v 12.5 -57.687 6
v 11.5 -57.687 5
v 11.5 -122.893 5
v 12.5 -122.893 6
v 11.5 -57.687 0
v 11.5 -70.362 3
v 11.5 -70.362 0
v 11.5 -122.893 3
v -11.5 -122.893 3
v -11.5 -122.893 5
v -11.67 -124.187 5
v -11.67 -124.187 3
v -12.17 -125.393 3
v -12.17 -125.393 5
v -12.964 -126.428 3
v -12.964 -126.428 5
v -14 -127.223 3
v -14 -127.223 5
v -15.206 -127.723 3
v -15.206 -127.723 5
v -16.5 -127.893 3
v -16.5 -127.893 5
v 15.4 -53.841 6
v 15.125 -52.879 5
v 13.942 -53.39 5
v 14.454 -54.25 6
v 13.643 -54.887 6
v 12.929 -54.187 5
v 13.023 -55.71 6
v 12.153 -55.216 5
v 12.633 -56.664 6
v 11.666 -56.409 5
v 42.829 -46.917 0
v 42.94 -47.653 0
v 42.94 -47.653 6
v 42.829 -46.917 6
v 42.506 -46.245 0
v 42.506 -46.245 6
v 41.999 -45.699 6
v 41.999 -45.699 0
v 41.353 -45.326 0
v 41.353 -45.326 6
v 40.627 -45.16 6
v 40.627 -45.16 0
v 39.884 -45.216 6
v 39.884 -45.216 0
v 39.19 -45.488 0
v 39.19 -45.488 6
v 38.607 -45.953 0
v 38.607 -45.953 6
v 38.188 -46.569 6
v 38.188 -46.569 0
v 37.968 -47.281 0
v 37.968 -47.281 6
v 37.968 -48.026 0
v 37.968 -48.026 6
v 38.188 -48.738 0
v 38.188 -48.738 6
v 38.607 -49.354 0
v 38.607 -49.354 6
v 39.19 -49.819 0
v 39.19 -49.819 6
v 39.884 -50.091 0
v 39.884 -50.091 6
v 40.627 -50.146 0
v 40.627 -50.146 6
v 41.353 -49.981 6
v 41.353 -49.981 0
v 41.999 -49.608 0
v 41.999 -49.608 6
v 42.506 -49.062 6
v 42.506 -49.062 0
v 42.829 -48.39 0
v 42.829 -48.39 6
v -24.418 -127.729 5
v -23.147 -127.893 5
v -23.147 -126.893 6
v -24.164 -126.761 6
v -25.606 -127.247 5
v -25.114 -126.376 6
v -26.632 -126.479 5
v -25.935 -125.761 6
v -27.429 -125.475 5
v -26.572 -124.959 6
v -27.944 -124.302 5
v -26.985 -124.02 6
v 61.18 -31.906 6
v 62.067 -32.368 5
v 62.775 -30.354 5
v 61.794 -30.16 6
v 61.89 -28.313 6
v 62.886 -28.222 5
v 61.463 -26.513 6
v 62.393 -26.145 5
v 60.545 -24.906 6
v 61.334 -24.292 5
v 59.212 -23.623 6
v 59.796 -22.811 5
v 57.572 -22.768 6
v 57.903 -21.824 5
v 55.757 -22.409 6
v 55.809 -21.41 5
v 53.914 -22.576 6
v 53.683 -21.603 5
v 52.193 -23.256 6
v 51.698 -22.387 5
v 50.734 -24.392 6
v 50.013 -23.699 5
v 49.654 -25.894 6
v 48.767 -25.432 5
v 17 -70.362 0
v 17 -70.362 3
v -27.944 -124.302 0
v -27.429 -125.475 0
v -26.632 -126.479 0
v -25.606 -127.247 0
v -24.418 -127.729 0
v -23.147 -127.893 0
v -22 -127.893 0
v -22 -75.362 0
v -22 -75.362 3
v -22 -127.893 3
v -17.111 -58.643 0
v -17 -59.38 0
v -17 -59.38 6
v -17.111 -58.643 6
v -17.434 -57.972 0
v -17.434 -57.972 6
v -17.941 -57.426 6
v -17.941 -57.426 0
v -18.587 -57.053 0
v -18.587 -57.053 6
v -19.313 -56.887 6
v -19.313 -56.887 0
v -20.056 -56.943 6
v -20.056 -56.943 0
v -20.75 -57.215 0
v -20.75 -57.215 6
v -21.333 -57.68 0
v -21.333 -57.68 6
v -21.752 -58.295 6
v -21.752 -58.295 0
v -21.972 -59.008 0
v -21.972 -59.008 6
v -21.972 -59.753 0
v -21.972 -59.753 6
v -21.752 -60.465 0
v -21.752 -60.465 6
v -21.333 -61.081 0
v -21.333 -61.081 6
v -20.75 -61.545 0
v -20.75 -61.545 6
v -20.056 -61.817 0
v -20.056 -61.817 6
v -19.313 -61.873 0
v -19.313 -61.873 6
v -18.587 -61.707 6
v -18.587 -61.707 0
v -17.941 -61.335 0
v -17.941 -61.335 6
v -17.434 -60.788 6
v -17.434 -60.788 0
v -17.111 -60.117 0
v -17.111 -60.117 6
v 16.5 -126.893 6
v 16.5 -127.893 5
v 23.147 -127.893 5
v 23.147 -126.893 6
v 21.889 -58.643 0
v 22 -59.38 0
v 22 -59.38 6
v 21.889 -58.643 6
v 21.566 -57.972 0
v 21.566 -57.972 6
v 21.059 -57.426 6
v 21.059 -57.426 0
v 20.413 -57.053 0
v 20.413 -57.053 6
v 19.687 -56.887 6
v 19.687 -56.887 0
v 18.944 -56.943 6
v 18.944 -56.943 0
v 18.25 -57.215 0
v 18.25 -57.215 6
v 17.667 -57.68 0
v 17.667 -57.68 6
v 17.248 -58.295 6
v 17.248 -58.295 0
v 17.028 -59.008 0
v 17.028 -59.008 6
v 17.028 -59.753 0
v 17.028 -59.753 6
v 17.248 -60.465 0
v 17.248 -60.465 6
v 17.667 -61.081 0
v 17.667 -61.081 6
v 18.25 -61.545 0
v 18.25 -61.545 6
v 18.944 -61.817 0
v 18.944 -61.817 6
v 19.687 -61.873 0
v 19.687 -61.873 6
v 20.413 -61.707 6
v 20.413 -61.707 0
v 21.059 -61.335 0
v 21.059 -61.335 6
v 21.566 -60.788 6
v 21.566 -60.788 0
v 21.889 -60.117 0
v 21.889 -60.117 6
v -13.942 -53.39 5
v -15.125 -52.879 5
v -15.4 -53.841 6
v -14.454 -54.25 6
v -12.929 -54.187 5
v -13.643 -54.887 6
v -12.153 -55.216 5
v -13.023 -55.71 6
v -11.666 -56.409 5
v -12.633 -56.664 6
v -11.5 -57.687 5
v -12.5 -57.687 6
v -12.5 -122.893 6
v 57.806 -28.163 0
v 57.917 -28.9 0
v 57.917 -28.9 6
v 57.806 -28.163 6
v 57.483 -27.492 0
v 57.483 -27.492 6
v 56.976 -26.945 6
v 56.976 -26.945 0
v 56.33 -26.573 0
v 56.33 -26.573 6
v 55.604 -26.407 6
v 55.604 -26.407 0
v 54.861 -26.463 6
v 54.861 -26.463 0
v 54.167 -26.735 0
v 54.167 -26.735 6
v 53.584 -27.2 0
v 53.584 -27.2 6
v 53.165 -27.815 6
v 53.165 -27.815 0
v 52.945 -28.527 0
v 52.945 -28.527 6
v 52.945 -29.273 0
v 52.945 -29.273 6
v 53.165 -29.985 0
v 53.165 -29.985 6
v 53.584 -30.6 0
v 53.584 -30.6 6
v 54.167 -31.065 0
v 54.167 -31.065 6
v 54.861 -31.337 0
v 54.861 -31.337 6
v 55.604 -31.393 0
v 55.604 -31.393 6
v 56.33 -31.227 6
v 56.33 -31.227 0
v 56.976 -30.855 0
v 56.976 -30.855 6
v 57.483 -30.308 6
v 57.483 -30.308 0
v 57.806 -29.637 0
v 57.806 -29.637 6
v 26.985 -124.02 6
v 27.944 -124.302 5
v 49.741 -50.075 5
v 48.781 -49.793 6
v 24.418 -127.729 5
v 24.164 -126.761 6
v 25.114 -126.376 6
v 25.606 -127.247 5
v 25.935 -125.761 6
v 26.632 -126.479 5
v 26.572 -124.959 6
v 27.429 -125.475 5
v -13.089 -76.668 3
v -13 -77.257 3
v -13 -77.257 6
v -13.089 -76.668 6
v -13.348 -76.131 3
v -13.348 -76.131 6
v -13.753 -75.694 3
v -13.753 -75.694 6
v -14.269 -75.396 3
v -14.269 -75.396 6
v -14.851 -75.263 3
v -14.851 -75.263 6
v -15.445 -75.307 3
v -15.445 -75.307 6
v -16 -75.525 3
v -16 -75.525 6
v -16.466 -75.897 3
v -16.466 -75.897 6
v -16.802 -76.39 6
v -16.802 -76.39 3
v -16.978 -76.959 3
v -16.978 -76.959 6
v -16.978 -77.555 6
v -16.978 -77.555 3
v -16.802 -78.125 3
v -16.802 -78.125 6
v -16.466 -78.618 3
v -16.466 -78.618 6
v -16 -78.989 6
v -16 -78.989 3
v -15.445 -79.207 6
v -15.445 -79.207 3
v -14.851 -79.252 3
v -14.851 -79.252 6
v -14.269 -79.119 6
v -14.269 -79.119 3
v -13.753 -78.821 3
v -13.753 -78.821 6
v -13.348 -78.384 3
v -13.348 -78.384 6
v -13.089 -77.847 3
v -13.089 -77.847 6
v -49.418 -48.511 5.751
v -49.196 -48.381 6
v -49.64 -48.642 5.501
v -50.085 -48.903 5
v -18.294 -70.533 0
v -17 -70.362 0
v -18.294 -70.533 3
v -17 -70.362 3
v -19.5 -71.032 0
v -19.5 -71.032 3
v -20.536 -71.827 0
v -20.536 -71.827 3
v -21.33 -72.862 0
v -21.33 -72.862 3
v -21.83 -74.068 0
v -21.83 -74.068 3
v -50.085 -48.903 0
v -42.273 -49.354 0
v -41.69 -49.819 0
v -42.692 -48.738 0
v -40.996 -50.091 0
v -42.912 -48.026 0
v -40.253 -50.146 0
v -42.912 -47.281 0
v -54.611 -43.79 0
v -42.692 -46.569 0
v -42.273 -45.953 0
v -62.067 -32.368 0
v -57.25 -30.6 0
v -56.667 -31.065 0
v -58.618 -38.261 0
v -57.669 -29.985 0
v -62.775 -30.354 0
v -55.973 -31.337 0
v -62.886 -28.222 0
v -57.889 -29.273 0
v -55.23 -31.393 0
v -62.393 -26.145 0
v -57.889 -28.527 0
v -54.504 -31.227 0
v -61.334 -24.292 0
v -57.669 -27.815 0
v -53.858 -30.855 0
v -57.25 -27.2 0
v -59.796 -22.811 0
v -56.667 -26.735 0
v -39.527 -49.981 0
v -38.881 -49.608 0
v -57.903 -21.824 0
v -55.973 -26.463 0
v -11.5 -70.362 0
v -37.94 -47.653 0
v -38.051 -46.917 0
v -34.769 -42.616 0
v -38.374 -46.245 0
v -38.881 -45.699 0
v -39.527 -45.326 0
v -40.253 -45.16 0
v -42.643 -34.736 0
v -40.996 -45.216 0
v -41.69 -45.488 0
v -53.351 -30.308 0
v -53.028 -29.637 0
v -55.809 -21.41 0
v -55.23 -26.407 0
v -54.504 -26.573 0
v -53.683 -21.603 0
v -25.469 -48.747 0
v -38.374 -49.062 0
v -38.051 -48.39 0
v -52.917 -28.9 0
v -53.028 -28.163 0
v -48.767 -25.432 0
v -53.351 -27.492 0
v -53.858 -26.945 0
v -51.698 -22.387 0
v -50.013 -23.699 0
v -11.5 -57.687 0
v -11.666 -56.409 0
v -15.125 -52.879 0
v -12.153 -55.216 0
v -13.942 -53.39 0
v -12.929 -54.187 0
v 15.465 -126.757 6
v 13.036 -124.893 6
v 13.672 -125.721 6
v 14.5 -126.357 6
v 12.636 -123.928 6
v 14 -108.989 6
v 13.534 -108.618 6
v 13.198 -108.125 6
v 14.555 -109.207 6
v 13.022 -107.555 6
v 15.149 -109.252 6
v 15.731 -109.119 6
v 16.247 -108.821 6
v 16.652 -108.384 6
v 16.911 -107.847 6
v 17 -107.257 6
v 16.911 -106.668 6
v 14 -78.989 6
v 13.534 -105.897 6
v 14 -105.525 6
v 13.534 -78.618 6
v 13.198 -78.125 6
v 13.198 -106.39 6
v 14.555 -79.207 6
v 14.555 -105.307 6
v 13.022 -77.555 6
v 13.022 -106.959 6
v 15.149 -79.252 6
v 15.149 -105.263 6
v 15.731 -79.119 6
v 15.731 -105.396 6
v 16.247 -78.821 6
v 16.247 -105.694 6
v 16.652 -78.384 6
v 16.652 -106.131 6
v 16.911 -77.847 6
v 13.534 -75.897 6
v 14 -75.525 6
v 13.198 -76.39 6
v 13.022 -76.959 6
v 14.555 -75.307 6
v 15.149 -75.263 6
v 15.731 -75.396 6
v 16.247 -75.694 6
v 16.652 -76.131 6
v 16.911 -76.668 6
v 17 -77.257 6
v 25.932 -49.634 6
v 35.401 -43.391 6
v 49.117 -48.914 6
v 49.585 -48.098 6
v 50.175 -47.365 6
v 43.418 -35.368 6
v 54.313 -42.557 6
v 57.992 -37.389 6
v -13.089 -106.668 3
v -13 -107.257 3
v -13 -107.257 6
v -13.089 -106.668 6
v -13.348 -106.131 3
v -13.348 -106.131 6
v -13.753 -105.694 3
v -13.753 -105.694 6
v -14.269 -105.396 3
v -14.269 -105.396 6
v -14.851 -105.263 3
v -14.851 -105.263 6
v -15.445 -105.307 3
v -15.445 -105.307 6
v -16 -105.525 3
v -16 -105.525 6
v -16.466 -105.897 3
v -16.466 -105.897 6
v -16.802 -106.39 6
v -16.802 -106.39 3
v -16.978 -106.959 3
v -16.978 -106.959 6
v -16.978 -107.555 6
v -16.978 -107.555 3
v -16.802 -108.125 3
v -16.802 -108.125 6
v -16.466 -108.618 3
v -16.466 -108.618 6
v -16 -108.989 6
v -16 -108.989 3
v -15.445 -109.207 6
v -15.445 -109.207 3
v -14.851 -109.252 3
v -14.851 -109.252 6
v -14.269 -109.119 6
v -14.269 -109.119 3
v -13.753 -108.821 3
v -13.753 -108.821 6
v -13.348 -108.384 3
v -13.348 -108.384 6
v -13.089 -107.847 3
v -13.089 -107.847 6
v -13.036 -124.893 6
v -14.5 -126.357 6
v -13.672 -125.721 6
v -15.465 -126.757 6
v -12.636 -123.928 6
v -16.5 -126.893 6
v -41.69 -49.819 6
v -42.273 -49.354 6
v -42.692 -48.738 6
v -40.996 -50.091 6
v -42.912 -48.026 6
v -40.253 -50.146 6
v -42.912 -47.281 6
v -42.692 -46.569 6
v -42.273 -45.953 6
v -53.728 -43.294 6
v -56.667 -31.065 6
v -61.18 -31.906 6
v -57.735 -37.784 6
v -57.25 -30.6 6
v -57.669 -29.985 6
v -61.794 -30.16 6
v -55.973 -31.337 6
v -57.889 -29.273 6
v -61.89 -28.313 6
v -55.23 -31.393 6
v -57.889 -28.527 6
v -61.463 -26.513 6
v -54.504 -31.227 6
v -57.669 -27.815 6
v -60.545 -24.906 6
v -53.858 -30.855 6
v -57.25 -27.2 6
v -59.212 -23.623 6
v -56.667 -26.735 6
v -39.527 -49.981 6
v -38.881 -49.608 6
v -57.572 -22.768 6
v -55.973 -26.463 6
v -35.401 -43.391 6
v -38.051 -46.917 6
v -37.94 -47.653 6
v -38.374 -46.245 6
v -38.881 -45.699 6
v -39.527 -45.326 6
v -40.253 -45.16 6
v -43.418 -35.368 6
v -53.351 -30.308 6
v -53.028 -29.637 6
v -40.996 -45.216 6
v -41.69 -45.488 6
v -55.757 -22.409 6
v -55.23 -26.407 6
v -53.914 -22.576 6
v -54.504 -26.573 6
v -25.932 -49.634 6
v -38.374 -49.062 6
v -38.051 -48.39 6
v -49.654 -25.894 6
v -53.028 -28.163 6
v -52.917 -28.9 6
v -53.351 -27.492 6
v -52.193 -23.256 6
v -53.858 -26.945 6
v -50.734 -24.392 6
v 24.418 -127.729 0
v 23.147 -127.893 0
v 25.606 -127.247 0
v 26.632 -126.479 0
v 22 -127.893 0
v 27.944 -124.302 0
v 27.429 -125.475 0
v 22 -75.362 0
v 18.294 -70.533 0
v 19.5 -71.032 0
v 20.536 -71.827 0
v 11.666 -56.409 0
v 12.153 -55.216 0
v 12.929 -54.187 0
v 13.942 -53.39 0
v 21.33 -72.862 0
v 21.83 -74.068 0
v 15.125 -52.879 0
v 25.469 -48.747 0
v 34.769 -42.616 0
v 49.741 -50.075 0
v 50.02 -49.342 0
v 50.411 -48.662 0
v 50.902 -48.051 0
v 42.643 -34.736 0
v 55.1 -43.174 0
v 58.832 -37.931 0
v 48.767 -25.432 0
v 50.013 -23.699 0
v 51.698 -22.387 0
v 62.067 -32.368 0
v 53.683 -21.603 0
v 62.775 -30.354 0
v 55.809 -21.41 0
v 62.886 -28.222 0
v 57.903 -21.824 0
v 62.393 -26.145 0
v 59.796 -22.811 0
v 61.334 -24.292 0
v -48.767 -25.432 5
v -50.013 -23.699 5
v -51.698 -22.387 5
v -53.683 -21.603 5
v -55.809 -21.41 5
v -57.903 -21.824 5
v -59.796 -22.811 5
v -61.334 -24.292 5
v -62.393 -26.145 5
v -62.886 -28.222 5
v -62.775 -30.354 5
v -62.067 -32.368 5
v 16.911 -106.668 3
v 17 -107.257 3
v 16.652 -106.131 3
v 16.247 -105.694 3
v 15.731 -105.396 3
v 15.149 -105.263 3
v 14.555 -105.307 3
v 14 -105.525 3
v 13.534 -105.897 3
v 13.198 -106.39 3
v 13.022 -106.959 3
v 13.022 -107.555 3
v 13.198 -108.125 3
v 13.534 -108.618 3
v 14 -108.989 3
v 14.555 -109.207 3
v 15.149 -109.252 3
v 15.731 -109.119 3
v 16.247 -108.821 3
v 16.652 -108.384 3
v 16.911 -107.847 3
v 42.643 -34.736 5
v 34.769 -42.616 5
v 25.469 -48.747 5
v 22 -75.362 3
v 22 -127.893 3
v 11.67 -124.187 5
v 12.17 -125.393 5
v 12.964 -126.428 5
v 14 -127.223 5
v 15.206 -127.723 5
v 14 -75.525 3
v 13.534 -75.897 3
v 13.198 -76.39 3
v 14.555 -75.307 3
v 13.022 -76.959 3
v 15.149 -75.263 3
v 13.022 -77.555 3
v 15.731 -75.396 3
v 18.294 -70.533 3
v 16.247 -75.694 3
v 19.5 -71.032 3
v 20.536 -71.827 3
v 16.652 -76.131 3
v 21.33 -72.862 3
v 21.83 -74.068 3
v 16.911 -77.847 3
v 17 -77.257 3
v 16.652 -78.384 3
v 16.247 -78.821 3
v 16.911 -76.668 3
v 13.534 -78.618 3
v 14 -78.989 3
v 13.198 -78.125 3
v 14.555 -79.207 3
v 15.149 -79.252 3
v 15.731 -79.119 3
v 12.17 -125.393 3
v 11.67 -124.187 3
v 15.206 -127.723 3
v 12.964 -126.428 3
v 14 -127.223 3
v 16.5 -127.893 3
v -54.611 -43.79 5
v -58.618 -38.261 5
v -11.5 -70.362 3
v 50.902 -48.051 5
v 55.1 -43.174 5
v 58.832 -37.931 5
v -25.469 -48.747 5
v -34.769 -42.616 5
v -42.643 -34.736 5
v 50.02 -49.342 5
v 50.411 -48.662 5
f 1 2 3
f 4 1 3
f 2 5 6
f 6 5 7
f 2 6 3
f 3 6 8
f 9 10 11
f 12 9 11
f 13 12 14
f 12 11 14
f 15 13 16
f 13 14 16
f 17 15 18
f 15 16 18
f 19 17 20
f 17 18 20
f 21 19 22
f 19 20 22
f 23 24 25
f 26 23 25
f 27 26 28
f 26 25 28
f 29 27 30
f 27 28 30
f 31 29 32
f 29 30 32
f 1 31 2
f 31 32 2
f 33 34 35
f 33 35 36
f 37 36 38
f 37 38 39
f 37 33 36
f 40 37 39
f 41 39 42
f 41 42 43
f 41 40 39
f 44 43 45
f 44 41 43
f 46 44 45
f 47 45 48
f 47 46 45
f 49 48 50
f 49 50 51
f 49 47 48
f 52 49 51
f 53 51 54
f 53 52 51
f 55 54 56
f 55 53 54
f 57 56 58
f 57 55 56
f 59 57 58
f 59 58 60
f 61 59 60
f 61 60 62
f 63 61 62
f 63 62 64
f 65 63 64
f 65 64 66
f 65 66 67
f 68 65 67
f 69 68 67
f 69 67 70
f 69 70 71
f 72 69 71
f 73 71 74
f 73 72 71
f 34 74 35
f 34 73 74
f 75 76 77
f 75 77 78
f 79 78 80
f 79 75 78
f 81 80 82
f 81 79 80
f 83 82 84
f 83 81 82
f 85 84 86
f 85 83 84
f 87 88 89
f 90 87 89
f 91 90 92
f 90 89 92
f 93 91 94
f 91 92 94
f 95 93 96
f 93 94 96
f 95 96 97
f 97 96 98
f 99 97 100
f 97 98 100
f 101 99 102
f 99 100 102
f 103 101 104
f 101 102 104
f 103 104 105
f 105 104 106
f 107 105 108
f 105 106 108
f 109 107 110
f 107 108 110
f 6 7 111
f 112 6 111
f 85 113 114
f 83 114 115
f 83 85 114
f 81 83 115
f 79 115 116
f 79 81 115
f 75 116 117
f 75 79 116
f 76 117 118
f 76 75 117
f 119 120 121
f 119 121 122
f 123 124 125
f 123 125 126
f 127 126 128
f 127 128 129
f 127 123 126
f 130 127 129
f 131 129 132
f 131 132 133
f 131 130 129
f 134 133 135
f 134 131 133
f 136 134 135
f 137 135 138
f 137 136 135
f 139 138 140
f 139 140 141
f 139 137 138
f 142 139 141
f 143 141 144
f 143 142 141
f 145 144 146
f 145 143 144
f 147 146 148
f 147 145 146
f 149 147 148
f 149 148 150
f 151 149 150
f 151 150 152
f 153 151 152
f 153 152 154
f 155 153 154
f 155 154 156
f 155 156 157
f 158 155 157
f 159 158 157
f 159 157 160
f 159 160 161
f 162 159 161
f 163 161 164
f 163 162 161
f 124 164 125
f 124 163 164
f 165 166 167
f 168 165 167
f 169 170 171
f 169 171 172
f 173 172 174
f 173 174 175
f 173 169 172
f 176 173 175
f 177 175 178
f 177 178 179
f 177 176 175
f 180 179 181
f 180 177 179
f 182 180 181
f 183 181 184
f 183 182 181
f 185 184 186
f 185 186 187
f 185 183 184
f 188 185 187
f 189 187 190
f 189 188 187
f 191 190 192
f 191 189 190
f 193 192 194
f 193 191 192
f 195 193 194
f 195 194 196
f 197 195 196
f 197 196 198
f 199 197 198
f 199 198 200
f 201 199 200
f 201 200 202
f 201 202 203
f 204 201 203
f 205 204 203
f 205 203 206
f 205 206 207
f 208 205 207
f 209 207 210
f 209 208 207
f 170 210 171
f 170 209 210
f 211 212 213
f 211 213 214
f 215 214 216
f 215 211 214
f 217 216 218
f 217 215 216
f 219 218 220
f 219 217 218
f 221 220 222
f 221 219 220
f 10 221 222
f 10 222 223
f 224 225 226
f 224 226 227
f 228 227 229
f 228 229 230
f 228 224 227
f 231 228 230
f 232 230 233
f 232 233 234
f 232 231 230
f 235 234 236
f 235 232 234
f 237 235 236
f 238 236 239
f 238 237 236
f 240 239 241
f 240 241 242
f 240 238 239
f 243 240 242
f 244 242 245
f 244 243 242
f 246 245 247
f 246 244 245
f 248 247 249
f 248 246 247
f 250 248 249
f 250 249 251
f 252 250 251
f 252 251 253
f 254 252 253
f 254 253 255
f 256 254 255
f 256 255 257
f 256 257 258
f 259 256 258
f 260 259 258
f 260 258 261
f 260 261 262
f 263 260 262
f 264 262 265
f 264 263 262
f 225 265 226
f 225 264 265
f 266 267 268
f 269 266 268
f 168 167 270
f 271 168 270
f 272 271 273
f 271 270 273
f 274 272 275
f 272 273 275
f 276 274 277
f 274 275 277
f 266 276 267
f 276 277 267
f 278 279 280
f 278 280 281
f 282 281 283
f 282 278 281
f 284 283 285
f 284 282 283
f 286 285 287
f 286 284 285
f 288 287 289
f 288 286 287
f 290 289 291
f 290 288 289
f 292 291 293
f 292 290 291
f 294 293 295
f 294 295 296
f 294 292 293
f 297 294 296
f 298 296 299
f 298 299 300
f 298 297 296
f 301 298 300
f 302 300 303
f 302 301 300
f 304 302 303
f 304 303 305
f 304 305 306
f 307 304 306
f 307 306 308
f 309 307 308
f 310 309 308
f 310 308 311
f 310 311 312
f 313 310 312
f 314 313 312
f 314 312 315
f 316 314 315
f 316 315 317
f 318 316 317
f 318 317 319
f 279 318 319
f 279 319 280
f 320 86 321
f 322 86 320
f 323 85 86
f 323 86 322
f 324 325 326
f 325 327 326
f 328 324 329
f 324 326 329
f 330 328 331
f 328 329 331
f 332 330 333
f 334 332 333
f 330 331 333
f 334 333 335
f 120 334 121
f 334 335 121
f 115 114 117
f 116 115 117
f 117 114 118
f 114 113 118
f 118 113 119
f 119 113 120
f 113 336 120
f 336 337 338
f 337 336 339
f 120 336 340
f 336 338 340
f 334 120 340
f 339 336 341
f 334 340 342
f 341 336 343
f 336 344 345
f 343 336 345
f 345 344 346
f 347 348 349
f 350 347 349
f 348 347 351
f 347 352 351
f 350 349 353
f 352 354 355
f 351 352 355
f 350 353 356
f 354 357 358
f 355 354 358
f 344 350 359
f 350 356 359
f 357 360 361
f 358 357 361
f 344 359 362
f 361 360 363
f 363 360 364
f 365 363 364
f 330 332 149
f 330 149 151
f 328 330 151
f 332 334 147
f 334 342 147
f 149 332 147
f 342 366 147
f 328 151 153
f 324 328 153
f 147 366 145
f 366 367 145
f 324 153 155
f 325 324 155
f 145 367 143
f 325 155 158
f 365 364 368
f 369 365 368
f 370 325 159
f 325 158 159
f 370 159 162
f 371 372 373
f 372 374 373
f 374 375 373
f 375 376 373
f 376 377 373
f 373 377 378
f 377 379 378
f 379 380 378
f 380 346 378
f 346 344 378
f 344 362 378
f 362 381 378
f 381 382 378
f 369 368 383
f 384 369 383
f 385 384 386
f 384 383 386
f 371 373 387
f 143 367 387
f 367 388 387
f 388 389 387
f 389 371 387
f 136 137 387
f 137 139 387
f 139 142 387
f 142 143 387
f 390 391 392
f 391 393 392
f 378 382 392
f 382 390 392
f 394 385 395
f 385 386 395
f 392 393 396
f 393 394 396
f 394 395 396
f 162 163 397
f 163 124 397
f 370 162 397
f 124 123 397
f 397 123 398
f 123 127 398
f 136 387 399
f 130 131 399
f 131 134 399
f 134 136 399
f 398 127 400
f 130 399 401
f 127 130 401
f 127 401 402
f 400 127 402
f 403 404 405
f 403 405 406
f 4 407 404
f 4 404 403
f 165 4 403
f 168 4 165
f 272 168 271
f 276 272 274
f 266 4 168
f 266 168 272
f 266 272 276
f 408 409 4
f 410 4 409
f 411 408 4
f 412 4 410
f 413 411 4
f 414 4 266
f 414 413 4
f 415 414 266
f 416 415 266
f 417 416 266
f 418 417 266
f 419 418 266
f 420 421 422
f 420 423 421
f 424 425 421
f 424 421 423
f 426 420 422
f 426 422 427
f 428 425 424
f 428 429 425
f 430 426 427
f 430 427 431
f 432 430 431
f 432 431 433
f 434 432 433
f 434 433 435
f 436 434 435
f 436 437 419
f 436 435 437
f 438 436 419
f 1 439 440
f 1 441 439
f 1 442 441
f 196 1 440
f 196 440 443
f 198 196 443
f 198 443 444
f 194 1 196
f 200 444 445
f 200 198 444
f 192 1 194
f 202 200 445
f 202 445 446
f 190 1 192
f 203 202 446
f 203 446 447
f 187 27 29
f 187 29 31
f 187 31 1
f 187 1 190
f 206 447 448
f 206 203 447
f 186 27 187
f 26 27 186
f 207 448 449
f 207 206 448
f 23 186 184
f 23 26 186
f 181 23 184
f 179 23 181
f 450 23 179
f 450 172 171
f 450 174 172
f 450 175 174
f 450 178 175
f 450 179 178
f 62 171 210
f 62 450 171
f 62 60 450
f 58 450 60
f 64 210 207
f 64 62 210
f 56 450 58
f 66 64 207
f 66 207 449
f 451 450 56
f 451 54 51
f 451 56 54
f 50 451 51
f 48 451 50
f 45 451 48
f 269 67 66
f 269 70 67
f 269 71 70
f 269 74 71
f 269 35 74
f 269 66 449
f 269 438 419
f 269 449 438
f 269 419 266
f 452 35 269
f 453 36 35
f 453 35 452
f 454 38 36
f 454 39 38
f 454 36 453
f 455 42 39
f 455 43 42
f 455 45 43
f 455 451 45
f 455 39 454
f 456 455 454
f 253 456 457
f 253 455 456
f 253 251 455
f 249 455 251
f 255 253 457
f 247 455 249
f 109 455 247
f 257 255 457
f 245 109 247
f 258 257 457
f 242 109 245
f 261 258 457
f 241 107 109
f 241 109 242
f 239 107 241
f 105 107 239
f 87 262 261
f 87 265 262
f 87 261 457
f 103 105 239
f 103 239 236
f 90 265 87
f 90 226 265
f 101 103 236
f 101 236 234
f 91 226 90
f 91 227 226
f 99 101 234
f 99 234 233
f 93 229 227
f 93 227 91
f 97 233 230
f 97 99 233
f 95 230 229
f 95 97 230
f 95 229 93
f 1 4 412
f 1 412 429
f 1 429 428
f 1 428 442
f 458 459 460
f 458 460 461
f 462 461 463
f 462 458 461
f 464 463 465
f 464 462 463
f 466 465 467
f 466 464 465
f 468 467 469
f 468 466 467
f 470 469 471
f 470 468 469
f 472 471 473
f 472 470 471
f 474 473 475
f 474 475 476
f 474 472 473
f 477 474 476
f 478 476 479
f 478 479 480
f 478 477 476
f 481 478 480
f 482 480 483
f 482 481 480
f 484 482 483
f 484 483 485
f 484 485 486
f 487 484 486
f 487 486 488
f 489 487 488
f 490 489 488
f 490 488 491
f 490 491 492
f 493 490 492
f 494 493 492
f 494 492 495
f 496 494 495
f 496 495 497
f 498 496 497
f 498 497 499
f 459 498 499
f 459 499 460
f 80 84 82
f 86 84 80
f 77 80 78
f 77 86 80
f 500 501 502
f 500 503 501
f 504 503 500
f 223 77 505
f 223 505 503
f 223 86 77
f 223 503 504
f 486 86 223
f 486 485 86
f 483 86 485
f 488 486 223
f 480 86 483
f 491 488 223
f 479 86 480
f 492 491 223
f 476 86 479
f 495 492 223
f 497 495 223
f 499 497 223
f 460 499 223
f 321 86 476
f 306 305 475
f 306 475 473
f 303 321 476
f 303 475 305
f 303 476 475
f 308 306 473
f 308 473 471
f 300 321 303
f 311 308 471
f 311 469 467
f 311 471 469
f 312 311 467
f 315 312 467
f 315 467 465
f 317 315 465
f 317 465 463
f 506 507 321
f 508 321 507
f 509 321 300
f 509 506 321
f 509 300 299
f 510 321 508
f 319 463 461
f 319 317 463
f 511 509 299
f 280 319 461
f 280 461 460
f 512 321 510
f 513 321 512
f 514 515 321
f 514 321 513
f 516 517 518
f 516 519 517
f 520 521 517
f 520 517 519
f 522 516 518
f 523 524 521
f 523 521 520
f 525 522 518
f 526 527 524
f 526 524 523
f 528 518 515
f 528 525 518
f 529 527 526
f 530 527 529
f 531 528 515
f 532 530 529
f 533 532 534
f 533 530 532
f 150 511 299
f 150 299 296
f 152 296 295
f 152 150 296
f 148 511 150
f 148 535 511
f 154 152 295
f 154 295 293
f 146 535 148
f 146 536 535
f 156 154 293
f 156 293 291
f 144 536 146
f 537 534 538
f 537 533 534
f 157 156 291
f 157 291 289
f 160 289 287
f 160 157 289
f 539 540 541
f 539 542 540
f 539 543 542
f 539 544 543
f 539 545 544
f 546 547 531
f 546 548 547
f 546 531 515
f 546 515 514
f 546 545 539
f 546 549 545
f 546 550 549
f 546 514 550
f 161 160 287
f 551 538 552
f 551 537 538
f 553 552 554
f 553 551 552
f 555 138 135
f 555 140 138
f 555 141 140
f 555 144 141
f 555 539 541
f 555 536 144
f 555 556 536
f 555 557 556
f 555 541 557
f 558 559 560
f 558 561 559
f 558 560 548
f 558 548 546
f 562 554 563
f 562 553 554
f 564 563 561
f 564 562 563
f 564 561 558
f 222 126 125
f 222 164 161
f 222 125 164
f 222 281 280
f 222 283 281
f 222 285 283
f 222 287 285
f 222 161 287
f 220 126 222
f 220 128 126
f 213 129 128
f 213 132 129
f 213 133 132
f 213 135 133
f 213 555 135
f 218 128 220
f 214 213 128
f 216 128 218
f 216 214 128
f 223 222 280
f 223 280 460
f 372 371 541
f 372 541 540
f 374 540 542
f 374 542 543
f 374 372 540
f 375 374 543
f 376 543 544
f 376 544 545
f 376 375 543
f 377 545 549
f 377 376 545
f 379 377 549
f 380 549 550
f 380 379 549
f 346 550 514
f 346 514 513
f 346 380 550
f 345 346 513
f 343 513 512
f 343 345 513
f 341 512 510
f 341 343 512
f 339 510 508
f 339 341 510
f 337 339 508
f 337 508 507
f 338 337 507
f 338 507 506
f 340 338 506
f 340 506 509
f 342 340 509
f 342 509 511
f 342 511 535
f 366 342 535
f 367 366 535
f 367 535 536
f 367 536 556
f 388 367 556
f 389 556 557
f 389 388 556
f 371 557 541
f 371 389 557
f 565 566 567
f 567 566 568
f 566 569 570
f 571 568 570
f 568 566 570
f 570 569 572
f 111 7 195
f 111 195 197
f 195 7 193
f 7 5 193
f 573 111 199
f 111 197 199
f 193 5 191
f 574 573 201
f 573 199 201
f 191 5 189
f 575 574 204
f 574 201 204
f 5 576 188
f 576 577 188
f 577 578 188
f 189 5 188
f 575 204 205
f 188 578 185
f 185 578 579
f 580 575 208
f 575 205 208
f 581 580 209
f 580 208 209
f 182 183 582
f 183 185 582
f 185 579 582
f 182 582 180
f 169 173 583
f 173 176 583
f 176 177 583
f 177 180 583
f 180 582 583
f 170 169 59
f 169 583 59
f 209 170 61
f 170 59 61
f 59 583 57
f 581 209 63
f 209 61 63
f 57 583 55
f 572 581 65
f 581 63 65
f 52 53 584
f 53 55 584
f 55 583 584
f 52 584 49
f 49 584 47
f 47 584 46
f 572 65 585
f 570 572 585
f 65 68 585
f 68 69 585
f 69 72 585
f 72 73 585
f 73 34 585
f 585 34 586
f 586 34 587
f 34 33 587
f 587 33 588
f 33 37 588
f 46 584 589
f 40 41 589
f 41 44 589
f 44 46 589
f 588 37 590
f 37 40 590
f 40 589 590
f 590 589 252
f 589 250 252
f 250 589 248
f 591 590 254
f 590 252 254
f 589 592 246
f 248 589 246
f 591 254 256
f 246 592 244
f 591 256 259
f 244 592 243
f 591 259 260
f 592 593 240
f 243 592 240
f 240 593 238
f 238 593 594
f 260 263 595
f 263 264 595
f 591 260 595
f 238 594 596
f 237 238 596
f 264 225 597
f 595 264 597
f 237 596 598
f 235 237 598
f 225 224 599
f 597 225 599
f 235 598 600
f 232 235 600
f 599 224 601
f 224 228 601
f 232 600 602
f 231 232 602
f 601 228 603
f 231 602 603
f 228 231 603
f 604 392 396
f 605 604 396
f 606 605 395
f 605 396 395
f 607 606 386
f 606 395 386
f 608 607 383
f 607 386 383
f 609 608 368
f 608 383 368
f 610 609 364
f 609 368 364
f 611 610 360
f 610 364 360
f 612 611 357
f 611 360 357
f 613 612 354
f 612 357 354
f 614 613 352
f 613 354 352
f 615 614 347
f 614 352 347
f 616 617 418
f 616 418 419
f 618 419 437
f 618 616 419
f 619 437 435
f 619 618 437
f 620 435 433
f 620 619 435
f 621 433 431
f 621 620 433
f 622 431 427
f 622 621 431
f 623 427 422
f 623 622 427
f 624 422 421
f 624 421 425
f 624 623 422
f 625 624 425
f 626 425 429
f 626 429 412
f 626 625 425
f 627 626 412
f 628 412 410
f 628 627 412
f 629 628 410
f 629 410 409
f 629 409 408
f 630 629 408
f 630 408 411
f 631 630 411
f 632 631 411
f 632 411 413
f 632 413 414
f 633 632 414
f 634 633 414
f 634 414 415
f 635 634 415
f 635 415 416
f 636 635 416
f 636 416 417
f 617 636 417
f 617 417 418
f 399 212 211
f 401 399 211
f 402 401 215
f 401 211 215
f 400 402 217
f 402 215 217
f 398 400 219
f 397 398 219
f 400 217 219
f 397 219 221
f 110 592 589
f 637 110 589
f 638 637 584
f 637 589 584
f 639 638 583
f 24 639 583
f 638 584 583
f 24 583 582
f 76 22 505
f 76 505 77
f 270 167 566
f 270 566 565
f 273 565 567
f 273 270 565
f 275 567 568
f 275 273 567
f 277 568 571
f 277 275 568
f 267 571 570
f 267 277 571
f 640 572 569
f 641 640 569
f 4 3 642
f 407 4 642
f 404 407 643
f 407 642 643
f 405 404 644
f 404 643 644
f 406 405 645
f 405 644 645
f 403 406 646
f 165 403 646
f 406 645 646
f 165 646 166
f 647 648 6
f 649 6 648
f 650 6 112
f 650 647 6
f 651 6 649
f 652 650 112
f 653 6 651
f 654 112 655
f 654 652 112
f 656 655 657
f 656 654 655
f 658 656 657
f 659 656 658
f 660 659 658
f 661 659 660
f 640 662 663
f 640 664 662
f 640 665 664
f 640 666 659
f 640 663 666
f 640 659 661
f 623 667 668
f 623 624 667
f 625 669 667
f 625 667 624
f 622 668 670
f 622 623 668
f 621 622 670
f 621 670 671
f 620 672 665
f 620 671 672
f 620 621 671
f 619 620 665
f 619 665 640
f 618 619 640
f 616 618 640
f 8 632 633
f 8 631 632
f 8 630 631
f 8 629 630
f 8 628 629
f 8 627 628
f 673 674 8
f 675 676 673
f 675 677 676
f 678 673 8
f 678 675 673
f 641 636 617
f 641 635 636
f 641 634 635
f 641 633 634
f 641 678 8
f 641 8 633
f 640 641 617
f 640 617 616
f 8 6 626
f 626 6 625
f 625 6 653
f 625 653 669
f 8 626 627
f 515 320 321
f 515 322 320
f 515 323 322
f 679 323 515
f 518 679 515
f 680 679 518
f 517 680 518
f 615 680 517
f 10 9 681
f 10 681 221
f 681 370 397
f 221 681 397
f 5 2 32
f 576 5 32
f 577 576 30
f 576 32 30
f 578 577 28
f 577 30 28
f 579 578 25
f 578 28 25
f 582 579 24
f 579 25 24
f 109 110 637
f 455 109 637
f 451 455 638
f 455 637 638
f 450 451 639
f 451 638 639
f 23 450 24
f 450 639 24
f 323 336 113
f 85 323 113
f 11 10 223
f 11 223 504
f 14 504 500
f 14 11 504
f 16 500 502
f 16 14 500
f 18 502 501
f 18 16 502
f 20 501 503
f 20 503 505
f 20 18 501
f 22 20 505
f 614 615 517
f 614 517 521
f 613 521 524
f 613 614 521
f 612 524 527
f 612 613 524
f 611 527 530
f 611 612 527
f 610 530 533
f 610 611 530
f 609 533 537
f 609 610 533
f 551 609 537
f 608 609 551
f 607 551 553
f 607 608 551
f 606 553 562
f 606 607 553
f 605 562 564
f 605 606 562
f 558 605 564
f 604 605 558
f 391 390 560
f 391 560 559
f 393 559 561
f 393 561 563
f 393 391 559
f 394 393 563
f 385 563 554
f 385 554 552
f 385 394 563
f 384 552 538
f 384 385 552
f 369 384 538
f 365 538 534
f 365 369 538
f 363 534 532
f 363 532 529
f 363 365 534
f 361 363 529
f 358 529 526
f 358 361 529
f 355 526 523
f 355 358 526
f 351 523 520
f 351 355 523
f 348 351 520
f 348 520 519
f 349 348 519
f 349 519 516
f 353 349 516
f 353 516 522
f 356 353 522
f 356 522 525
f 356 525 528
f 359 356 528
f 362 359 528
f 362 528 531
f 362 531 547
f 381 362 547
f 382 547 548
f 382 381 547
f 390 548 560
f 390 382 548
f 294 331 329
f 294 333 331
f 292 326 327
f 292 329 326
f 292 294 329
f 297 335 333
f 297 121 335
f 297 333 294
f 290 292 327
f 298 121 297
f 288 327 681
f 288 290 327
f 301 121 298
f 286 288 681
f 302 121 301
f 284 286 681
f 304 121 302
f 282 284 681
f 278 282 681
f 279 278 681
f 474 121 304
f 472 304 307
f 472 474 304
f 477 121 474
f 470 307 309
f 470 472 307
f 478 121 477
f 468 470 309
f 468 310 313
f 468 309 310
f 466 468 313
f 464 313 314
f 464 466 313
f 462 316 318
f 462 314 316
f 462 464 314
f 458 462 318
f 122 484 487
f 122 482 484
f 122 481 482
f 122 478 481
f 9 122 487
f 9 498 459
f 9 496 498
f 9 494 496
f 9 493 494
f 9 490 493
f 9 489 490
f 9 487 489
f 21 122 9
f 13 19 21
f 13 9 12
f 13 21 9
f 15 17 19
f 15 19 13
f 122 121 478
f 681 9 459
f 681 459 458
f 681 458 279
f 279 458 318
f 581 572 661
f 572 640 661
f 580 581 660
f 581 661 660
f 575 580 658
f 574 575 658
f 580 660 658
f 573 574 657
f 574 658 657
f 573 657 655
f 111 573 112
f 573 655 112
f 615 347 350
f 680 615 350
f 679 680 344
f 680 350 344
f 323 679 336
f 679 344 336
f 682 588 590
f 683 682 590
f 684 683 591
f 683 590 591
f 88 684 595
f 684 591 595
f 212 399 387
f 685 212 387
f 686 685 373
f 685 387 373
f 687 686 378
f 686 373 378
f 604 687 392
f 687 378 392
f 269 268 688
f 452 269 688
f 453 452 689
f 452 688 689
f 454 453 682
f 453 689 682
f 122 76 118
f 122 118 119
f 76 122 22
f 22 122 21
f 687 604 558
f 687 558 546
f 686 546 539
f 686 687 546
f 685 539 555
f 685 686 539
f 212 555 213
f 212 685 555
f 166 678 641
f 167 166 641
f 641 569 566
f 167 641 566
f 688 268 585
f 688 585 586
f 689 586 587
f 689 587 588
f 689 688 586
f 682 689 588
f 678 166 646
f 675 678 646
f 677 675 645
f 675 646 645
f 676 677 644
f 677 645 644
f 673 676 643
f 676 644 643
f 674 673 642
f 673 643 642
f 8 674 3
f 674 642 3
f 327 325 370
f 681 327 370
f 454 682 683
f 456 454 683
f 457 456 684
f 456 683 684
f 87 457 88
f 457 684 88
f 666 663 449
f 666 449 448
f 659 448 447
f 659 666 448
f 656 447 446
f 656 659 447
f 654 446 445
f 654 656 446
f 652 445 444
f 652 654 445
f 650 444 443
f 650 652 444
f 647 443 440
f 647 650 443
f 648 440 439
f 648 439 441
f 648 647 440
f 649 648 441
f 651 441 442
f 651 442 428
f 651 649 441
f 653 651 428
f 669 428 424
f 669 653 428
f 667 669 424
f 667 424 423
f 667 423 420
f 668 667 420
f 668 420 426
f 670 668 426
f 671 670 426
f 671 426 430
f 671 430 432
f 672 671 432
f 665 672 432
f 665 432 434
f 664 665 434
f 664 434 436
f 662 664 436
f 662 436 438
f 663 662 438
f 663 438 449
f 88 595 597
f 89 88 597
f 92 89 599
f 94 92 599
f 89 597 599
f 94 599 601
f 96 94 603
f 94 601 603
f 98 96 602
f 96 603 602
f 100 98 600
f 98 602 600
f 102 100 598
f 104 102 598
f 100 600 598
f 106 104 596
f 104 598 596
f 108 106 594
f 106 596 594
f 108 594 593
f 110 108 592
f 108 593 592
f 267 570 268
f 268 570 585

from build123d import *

# Parameters (mm, degrees)
F0_R      = 2
F0_R_2    = 2.5
F1_DEPTH  = 6
F2_R      = 5
F2_2_R    = 5
F3_SIZE   = 1
F3_2_SIZE = 1
F4_W      = 44
F4_H      = 80
F5_DEPTH  = 3
F6_R      = 5
F6_2_R    = 5


with BuildPart() as f1:
    # F0 (on Top) → F1 (new body)
    with BuildSketch(Plane.XY):
        with BuildLine():
            ThreePointArc((-48.7669224449, -25.4320128037), (-58.8849590698, -22.2499796708), (-62.0669922027, -32.3680162957))
            ThreePointArc((-62.0669922027, -32.3680162957), (-56.6822265111, -41.0746296118), (-50.0851457895, -48.9027419604))
            Line((-50.0851457895, -48.9027419604), (-26.8898074388, -127.8929053375))
            Line((-26.8898074388, -127.8929053375), (-11.5, -127.8929053375))
            Line((-11.5, -127.8929053375), (-11.5, -69.0488957189))
            Line((-11.5, -69.0488957189), (-11.5, -53.784291387))
            ThreePointArc((-11.5, -53.784291387), (-33.3014776018, -43.7722696412), (-48.7669224449, -25.4320128037))
        make_face()
        with Locations((-15, -107.2572916746)):
            Circle(F0_R, mode=Mode.SUBTRACT)
        with Locations((-15, -77.2572916746)):
            Circle(F0_R, mode=Mode.SUBTRACT)
        with Locations((-19.5, -59.3801313572)):
            Circle(F0_R_2, mode=Mode.SUBTRACT)
        with Locations((-40.4400420847, -47.6534678296)):
            Circle(F0_R_2, mode=Mode.SUBTRACT)
        with Locations((-55.4169573238, -28.9000145497)):
            Circle(F0_R_2, mode=Mode.SUBTRACT)
    extrude(amount=F1_DEPTH)

    # F2
    f2_edges = [f1.edges().sort_by_distance(p)[0] for p in [
        (-26.889807, -127.892905, 3),
        (-11.5, -127.892905, 3),
        (-11.5, -53.784291, 3),
    ]]
    fillet(f2_edges, radius=F2_R)

    # F3
    f3_edges = [f1.edges().sort_by_distance(p)[0] for p in [
        (-12.964466, -126.428439, 6),
    ]]
    chamfer(f3_edges, length=F3_SIZE)


with BuildPart() as f1b:
    # F0 (on Top) → F1, piece 2 (new body)
    with BuildSketch(Plane.XY):
        with BuildLine():
            Line((11.5, -69.0488957189), (11.5, -127.8929053375))
            Line((11.5, -127.8929053375), (26.8898074388, -127.8929053375))
            Line((26.8898074388, -127.8929053375), (50.0851457895, -48.9027419604))
            ThreePointArc((50.0851457895, -48.9027419604), (56.6822265111, -41.0746296118), (62.0669922027, -32.3680162957))
            ThreePointArc((62.0669922027, -32.3680162957), (58.8849590698, -22.2499796708), (48.7669224449, -25.4320128037))
            ThreePointArc((48.7669224449, -25.4320128037), (33.3014776018, -43.7722696412), (11.5, -53.784291387))
            Line((11.5, -53.784291387), (11.5, -69.0488957189))
        make_face()
        with Locations((15, -107.2572916746)):
            Circle(F0_R, mode=Mode.SUBTRACT)
        with Locations((15, -77.2572916746)):
            Circle(F0_R, mode=Mode.SUBTRACT)
        with Locations((19.5, -59.3801313572)):
            Circle(F0_R_2, mode=Mode.SUBTRACT)
        with Locations((40.4400420847, -47.6534678296)):
            Circle(F0_R_2, mode=Mode.SUBTRACT)
        with Locations((55.4169573238, -28.9000145497)):
            Circle(F0_R_2, mode=Mode.SUBTRACT)
    extrude(amount=F1_DEPTH)

    # F2#2
    f2_2_edges = [f1b.edges().sort_by_distance(p)[0] for p in [
        (11.5, -53.784291, 3),
        (11.5, -127.892905, 3),
        (26.889807, -127.892905, 3),
        (50.085146, -48.902742, 3),
    ]]
    fillet(f2_2_edges, radius=F2_2_R)

    # F3#2
    f3_2_edges = [f1b.edges().sort_by_distance(p)[0] for p in [
        (11.5, -90.289779, 6),
    ]]
    chamfer(f3_2_edges, length=F3_2_SIZE)


with BuildPart() as f5_tool:
    # F4 (on face) → F5 (new body)
    with BuildSketch(Plane(origin=(0, 0, 0), x_dir=(1, 0, 0), z_dir=(0, 0, -1))):
        with Locations((0, 110.3623062372)):
            Rectangle(F4_W, F4_H)
    extrude(amount=-F5_DEPTH)


with BuildPart() as f1_1:
    add(f1.part)

    # F5: cut by f5_tool
    add(f5_tool.part, mode=Mode.SUBTRACT)

    # F6#2
    f6_2_edges = [f1_1.edges().sort_by_distance(p)[0] for p in [
        (-22, -70.362306, 1.5),
    ]]
    fillet(f6_2_edges, radius=F6_2_R)


with BuildPart() as f1b_1:
    add(f1b.part)

    # F5: cut by f5_tool
    add(f5_tool.part, mode=Mode.SUBTRACT)

    # F6
    f6_edges = [f1b_1.edges().sort_by_distance(p)[0] for p in [
        (22, -70.362306, 1.5),
    ]]
    fillet(f6_edges, radius=F6_R)


solid = Compound([f1_1.part, f1b_1.part])
